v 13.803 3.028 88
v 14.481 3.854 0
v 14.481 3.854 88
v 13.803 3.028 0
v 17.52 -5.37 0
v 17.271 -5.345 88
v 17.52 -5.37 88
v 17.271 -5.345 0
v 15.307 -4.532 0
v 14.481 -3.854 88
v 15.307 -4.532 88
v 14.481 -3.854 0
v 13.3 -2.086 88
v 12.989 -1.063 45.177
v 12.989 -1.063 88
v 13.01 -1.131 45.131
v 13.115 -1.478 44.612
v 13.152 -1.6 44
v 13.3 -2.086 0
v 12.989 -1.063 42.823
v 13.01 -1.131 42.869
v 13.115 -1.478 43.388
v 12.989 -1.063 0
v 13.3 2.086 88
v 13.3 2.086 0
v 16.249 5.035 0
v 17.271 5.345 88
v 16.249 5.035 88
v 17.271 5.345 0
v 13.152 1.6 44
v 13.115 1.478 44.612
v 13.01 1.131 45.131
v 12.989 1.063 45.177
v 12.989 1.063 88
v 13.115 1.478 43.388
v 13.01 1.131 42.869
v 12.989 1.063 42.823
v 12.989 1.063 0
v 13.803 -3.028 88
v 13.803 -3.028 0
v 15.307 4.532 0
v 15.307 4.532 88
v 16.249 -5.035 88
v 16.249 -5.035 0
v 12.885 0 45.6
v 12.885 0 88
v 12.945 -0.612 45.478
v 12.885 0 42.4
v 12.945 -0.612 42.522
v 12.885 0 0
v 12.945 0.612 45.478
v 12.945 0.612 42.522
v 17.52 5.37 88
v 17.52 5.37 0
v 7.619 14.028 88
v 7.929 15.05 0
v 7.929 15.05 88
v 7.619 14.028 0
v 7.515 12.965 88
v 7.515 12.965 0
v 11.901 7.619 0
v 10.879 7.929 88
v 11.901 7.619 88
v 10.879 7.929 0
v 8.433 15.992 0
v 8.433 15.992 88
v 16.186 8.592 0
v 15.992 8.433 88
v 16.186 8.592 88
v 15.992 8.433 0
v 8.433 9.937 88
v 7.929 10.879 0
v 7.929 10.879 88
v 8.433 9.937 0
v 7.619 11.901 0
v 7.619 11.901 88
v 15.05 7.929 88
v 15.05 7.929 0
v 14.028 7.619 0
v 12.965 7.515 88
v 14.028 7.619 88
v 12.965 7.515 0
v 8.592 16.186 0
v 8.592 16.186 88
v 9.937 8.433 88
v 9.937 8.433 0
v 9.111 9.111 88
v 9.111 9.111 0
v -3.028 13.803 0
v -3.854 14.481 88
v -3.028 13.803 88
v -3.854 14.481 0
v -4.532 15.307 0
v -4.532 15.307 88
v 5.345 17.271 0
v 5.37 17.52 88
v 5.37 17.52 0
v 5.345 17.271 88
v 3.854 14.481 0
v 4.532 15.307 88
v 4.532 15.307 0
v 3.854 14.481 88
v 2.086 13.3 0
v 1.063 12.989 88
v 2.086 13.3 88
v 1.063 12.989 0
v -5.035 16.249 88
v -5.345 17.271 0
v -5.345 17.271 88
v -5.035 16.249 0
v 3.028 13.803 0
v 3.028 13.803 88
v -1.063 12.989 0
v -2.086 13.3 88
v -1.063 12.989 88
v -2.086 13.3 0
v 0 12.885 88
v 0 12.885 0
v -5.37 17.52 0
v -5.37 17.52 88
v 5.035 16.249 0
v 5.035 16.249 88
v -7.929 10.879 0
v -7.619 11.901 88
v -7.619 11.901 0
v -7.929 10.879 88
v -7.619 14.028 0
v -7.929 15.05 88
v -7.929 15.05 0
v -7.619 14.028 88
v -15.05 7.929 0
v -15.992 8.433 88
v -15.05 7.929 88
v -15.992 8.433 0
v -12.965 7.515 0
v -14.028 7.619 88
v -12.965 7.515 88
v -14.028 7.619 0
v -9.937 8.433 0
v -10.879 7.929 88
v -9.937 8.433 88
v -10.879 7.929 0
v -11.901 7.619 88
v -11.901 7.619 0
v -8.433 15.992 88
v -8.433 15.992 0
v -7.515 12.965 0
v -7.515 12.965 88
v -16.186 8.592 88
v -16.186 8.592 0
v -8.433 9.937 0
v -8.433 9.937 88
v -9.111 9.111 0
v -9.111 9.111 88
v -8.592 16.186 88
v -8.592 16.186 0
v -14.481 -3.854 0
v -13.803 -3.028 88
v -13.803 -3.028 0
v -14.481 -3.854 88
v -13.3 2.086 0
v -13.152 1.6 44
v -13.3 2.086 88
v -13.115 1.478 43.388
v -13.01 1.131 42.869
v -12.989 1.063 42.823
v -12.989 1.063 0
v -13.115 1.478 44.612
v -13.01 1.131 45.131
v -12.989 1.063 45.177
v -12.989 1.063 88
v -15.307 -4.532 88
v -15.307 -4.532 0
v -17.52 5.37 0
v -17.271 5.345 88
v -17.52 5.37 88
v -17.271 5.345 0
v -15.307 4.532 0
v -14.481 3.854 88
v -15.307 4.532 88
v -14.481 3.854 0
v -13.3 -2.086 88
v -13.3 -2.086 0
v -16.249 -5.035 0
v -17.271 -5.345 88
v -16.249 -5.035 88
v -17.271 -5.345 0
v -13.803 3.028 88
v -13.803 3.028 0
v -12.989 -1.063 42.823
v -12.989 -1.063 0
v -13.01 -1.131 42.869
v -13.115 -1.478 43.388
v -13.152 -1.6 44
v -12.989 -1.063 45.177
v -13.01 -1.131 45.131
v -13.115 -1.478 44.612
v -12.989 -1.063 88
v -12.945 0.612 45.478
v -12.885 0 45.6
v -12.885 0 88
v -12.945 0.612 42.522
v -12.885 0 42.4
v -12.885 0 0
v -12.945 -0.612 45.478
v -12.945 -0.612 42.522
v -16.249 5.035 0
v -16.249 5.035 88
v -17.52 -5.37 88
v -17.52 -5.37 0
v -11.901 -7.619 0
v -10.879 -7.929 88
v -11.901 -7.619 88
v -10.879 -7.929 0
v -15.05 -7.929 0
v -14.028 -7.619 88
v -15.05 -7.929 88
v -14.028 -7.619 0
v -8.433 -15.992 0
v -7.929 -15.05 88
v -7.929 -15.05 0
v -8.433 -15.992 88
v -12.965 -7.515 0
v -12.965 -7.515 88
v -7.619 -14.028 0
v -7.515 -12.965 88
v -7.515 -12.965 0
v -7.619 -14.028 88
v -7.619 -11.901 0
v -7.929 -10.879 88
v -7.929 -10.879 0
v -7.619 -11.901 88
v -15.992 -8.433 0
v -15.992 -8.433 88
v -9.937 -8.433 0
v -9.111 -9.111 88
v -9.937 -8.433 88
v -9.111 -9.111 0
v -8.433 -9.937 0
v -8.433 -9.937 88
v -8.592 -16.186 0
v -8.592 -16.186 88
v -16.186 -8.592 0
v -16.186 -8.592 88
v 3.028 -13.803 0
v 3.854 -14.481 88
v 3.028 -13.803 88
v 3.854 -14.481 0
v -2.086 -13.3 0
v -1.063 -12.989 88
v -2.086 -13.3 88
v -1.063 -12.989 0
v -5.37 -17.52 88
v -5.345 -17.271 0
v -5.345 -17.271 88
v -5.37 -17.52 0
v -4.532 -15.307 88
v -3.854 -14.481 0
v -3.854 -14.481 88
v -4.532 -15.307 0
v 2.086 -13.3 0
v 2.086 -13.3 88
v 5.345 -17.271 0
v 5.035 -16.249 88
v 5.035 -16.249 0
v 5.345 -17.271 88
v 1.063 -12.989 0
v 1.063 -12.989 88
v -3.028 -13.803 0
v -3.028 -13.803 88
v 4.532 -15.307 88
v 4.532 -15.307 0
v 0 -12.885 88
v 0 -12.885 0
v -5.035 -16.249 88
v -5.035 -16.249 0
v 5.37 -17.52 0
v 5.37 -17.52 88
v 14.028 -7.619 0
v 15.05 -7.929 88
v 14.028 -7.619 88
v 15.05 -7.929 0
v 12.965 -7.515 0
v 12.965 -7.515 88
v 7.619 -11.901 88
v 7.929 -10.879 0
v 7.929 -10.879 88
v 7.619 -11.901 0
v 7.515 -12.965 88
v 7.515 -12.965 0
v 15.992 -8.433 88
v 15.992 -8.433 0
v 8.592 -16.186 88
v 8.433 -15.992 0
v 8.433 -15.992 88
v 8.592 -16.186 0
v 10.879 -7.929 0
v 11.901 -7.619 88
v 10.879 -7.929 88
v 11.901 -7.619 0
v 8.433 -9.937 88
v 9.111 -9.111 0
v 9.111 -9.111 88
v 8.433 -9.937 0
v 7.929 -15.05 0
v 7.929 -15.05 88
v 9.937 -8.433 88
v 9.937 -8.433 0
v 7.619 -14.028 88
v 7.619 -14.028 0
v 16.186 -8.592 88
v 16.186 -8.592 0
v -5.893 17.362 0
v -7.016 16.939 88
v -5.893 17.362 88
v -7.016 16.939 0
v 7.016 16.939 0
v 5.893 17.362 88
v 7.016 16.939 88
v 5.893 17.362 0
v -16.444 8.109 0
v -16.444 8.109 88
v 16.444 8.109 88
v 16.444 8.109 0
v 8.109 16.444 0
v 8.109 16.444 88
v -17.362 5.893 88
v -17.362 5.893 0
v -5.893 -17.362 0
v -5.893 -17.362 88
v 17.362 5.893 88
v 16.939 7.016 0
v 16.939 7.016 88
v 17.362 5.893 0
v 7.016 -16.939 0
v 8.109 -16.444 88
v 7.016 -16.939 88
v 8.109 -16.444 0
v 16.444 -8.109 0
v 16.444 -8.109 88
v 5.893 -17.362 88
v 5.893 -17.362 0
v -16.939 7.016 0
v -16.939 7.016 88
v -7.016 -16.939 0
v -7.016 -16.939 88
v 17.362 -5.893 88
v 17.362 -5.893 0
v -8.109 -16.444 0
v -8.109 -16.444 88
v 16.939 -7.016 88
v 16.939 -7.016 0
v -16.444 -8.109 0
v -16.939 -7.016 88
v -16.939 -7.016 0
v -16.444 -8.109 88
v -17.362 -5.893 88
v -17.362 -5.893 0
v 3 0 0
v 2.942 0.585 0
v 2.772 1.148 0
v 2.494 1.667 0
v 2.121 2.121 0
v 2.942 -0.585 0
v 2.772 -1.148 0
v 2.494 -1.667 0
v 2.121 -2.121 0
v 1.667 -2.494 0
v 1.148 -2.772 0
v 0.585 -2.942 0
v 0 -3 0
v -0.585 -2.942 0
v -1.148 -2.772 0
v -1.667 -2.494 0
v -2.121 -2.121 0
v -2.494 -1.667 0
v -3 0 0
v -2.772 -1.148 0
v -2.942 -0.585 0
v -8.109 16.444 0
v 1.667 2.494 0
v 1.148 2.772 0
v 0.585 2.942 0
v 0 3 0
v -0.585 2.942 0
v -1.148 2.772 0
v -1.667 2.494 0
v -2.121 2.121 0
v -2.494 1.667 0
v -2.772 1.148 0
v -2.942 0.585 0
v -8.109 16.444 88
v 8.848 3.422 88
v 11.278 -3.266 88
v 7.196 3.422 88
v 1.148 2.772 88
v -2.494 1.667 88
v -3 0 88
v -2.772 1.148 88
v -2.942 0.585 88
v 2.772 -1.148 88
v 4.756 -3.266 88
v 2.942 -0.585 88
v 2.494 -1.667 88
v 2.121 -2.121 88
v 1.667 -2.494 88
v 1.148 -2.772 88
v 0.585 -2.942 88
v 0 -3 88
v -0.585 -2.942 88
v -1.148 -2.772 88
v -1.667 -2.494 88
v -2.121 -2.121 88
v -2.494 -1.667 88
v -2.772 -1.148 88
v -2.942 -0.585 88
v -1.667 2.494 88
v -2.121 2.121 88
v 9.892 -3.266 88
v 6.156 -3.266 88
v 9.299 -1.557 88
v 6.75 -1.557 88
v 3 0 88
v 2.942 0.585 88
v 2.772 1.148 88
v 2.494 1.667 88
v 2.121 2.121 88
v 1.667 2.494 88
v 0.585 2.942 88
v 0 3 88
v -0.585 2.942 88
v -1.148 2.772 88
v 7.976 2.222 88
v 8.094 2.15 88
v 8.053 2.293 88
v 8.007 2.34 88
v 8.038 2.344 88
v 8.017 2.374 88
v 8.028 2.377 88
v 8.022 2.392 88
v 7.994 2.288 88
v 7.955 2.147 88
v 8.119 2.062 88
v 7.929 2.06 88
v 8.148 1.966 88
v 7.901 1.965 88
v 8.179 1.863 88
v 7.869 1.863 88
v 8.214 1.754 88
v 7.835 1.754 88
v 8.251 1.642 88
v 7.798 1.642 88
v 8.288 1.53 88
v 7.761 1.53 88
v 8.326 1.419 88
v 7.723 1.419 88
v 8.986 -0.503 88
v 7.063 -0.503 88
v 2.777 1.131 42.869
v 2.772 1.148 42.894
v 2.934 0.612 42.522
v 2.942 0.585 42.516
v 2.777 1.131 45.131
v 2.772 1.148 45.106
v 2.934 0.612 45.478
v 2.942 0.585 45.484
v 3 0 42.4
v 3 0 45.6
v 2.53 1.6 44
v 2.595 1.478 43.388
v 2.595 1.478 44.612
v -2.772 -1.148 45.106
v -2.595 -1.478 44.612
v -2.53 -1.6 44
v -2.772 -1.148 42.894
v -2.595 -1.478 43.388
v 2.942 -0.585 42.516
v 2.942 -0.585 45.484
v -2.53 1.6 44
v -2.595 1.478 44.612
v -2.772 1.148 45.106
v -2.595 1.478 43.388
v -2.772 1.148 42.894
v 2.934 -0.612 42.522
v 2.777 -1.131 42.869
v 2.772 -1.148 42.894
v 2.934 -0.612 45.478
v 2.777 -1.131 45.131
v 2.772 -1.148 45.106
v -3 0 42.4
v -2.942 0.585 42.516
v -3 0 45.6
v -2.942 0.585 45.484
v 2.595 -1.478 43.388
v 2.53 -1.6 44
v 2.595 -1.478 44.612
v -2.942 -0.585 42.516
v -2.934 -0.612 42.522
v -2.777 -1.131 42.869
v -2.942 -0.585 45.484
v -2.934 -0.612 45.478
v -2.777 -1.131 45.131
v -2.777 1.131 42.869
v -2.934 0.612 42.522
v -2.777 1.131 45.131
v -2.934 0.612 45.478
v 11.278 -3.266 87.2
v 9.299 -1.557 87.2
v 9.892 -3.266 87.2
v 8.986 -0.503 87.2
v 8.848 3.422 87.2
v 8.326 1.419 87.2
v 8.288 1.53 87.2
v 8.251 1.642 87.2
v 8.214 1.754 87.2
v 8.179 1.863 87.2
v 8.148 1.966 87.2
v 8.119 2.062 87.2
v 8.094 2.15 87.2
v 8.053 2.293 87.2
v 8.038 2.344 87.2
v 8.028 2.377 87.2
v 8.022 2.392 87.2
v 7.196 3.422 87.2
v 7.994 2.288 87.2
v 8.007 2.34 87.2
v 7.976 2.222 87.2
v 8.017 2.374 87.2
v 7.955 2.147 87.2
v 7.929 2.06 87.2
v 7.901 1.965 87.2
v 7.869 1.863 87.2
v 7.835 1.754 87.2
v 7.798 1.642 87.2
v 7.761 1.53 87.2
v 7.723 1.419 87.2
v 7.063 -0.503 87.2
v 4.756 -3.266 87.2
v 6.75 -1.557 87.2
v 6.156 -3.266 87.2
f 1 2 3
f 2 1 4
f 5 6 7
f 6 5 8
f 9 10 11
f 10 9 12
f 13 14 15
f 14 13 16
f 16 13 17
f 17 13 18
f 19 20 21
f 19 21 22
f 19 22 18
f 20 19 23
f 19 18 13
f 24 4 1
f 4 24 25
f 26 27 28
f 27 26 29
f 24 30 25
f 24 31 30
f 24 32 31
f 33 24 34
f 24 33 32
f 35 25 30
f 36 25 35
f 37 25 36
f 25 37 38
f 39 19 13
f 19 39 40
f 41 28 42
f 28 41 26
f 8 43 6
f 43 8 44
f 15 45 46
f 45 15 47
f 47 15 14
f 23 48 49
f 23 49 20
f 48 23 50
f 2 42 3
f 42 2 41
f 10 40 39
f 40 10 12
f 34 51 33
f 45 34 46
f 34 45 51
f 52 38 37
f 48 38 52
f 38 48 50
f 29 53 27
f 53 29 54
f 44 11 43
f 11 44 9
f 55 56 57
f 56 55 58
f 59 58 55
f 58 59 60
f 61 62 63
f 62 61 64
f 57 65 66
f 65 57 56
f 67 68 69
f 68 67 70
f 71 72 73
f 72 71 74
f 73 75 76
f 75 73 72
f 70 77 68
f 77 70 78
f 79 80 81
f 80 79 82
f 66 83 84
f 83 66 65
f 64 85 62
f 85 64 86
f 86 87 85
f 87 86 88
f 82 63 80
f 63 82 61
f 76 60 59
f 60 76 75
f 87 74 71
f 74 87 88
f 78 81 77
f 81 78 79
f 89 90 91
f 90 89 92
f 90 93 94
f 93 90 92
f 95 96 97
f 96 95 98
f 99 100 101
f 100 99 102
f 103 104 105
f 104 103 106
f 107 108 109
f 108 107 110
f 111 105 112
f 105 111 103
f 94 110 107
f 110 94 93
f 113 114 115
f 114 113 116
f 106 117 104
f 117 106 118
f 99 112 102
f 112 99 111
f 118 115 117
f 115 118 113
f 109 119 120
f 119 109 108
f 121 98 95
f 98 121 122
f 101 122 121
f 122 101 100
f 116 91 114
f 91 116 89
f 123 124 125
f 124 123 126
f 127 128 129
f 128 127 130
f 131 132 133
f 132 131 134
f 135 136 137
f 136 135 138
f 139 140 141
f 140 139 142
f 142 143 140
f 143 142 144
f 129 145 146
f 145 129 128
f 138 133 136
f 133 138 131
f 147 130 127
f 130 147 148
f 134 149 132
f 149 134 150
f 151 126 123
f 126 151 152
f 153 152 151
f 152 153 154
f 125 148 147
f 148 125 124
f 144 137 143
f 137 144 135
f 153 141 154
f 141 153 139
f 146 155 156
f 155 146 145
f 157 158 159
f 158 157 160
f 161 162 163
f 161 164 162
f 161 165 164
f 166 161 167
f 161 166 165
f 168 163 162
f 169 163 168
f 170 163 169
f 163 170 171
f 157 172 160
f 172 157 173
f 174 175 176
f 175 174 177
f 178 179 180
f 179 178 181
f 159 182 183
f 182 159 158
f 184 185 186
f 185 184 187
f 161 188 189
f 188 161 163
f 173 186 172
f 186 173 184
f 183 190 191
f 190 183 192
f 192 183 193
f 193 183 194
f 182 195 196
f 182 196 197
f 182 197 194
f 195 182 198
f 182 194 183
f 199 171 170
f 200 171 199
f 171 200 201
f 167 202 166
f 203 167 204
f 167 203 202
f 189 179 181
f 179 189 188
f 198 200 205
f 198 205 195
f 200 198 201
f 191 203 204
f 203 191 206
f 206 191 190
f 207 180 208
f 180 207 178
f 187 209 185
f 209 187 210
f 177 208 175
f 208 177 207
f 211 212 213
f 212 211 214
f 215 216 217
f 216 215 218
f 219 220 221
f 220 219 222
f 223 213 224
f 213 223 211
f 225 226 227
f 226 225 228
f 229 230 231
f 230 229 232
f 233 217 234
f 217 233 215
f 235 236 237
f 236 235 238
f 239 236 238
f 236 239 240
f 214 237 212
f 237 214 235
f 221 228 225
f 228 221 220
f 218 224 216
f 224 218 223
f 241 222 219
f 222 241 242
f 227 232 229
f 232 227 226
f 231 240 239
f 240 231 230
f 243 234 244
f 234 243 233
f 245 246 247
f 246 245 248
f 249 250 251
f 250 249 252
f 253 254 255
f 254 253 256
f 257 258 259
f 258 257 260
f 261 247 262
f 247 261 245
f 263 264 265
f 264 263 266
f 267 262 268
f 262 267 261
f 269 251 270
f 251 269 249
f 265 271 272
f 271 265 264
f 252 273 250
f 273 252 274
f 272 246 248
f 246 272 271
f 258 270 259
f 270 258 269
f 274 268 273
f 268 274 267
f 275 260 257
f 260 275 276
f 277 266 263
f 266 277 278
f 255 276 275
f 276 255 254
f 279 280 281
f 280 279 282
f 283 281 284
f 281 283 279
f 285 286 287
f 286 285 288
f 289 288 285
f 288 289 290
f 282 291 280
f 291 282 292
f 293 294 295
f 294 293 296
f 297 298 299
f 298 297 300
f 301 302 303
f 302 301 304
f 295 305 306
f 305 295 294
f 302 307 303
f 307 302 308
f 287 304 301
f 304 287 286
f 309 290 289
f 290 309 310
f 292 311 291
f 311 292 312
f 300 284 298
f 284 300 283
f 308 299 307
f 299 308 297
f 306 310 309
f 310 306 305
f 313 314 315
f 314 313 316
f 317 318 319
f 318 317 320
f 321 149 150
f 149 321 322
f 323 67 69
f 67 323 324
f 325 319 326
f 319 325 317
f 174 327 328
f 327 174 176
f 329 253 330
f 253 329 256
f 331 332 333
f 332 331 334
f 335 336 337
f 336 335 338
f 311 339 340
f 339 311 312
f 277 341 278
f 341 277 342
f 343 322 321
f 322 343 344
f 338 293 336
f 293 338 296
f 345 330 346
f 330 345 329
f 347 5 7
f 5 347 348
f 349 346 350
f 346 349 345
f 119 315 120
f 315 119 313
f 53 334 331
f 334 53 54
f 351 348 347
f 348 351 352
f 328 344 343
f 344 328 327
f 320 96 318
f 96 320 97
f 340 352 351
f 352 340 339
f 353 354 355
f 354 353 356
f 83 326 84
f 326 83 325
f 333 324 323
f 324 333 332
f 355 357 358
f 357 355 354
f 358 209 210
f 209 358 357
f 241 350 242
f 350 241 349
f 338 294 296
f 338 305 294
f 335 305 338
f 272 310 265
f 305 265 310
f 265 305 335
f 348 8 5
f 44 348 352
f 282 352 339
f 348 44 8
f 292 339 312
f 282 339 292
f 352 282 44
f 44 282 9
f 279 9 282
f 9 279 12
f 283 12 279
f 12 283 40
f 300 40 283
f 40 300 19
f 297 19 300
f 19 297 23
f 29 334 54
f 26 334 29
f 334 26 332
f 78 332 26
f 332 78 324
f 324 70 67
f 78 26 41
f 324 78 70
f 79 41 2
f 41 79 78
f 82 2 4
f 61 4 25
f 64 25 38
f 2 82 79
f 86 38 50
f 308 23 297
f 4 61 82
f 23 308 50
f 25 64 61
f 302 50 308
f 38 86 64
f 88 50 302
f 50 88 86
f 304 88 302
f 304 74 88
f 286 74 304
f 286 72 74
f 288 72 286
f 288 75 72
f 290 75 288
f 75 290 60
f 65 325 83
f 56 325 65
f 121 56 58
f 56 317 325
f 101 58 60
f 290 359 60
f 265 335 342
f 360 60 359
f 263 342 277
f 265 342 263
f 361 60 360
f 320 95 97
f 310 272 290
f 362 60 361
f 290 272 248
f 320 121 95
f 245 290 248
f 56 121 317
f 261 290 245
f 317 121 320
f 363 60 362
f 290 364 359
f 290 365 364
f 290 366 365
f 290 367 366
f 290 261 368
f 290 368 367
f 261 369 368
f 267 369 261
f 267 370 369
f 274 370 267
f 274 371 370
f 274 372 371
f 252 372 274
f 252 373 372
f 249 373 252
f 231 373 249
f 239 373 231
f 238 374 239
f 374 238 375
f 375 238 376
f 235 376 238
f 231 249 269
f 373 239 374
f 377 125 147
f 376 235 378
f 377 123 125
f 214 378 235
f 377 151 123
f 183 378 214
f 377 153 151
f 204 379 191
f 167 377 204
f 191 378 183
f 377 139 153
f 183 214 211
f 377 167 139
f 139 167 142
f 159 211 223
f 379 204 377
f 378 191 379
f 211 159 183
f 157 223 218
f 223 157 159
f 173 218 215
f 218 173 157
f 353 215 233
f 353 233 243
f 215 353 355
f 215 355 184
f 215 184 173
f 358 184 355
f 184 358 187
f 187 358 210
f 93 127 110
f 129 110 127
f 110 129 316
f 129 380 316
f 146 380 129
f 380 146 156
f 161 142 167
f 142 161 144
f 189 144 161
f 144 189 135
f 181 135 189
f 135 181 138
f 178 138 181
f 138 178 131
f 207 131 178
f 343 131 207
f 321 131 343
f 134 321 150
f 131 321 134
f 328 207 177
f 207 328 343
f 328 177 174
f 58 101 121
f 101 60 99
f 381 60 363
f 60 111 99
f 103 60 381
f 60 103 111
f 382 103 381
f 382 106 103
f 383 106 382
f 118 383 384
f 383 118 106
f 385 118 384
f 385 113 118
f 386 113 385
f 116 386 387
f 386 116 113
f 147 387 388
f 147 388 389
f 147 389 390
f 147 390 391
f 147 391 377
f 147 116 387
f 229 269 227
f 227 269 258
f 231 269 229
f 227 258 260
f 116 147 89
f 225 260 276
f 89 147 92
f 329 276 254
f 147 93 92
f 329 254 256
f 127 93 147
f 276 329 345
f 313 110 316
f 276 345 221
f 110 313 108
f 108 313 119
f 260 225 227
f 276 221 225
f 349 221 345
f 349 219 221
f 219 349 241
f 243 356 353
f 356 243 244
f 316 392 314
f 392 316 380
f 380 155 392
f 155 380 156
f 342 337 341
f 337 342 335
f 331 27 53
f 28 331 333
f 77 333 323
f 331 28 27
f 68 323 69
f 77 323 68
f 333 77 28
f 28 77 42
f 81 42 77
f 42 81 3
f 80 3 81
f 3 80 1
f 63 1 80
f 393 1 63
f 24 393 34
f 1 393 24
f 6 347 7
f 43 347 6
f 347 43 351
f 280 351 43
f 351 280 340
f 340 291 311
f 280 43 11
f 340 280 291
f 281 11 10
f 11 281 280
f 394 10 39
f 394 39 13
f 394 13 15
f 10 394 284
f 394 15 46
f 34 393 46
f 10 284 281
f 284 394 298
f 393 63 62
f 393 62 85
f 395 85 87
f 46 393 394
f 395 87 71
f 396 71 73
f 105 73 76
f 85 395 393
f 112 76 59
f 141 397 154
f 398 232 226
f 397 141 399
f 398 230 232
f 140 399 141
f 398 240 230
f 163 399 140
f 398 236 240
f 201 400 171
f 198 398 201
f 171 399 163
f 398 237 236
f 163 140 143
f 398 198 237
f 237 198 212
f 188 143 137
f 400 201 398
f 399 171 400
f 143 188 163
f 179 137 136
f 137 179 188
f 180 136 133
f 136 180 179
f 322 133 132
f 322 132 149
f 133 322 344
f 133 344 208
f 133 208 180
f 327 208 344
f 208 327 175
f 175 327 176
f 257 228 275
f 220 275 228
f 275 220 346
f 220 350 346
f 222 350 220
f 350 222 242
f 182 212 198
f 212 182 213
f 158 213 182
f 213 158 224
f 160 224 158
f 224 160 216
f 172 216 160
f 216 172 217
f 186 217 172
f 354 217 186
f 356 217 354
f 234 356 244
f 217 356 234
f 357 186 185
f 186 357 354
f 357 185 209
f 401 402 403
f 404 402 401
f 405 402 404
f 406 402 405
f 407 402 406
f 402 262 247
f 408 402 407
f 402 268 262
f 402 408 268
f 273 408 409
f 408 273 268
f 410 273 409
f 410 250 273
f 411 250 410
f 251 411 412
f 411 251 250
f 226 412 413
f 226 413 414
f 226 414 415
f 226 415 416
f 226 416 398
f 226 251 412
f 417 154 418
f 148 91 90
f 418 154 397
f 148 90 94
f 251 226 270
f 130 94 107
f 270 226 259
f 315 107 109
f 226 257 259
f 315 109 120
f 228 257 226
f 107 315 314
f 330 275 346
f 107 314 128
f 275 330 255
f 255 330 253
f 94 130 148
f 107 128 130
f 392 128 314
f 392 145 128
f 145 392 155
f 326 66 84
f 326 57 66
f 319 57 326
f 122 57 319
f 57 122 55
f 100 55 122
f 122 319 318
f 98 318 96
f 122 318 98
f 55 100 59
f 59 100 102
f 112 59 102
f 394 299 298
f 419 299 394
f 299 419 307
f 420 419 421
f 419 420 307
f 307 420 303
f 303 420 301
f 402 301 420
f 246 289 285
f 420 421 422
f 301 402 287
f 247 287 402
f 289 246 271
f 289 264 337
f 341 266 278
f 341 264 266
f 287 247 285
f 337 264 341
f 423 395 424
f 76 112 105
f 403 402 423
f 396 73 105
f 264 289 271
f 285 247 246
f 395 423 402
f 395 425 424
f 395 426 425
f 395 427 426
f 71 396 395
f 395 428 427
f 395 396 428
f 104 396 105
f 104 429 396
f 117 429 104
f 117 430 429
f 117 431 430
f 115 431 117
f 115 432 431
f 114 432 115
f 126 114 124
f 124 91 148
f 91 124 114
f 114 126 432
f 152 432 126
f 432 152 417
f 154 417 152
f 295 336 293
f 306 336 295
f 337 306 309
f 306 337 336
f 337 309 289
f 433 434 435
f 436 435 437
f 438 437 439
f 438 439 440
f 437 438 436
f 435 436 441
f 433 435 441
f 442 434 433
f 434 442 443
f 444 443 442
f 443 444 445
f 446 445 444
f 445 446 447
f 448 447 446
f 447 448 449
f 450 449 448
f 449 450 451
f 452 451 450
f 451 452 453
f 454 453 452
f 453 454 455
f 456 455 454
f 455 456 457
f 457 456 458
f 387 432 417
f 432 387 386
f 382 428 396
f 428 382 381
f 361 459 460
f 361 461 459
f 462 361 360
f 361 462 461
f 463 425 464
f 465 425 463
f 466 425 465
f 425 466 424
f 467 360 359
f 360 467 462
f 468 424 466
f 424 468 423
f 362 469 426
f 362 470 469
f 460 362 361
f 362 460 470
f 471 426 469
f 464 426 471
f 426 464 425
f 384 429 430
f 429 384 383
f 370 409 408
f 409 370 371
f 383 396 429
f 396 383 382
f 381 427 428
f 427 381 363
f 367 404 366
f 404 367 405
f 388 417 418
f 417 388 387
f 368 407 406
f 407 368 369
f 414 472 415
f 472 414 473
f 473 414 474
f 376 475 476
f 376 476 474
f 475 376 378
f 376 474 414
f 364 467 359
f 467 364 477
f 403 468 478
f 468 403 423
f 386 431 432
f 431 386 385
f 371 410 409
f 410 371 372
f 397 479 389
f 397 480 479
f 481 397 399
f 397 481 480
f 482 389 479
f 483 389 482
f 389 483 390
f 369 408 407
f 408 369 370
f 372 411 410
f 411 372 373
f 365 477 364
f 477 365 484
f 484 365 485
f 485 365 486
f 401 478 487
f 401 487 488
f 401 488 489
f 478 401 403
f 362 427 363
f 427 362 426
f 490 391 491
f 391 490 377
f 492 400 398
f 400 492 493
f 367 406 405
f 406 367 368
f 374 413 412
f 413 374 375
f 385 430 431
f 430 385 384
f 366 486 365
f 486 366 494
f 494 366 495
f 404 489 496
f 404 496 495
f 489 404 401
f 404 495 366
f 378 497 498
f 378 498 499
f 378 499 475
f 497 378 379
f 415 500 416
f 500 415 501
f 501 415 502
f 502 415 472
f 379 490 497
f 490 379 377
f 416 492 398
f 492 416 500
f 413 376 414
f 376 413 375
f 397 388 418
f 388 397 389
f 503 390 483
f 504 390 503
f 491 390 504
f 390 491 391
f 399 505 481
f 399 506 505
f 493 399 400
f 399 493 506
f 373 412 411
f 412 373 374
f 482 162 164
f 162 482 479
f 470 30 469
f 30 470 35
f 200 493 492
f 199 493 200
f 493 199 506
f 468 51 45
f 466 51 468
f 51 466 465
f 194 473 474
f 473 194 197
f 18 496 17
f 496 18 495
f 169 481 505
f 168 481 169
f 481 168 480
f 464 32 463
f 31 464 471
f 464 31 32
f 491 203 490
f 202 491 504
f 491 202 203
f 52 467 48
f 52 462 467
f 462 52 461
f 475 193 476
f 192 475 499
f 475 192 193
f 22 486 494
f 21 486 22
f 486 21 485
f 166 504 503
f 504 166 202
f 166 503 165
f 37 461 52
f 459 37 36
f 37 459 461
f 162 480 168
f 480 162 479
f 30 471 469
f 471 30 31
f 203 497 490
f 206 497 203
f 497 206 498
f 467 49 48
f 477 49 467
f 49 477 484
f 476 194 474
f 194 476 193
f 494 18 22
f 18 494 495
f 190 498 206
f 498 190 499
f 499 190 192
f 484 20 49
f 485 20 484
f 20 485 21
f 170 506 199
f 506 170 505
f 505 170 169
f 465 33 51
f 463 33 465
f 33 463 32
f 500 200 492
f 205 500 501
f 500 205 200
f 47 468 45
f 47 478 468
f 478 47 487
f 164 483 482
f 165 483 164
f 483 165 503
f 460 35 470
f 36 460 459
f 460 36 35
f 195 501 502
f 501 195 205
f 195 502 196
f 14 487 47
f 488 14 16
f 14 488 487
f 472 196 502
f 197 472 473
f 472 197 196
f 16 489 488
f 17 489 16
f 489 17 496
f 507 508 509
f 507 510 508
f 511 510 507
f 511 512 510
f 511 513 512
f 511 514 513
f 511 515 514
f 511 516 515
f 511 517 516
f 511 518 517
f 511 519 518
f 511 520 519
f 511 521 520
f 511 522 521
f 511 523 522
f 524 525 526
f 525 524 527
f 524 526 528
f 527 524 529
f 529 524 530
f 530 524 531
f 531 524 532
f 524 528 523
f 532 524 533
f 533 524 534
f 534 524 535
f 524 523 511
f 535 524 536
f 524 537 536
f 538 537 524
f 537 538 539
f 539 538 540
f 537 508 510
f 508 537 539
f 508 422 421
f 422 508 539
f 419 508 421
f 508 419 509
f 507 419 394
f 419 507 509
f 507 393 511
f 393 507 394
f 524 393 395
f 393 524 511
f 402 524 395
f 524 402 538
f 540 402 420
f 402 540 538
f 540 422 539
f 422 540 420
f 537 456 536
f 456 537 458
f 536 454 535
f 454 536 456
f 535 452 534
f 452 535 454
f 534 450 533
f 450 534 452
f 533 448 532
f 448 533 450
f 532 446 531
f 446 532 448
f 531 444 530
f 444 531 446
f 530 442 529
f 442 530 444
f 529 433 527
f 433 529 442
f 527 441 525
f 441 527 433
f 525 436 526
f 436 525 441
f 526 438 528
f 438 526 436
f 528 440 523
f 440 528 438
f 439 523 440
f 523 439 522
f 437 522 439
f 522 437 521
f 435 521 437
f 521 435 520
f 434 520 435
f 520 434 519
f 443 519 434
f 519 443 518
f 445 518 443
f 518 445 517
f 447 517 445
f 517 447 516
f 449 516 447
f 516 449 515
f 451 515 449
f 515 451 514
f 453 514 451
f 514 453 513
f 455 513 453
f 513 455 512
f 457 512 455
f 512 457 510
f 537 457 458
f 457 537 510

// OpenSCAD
// file: helpers.scad
// Shared 2D helpers used by wedge.scad, base.scad and lid.scad.

// Big half-plane (y >= 0), used to build angle masks. `big` just has to be
// larger than any radius used in the design.
module halfplane(big = 2000) {
    translate([-big/2, 0]) square([big, big]);
}

// An angular mask covering [-a/2, +a/2], built as the intersection of two
// half-planes rather than an origin-apex polygon: a sector polygon with its
// point pinned exactly at (0,0) tends to produce a self-touching ("bowtie")
// result once differenced against a same-apex sector for the inner radius,
// which extrudes into a non-manifold solid. Two rotated half-planes never
// share that degenerate vertex.
module angle_mask(a) {
    intersection() {
        rotate([0, 0, -a/2]) halfplane();
        rotate([0, 0, a/2 - 180]) halfplane();
    }
}

// A ring slice between radius r1 and r2, angular width a, centered on angle 0.
module ring_slice(r1, r2, a) {
    intersection() {
        difference() {
            circle(r = r2, $fn = 128);
            circle(r = r1, $fn = 128);
        }
        angle_mask(a);
    }
}

// --- Identificazione pezzi: una lettera incisa su ogni pezzo stampato ------
// Vedi la legenda completa (A-O) in assembly-guide.md. Uso: mettere questa
// come ultima operazione di un difference() sul solido del pezzo, dopo tutti
// gli altri fori/tagli. `ztop` è la quota della faccia piatta su cui incidere
// (nel sistema di coordinate locale del pezzo in quel punto); il taglio parte
// 0.8mm sotto e arriva 0.5mm sopra la faccia, apposta più profondo della sola
// incisione per evitare superfici coincidenti (stesso problema di mesh non
// manifold già visto altrove in questo progetto se il taglio si fermasse
// esattamente sulla superficie).
module label_cut(letter, x, y, ztop, depth = 0.8, size = 7) {
    translate([x, y, ztop - depth])
        linear_extrude(height = depth + 0.5)
            text(letter, size = size, halign = "center", valign = "center",
                 font = "Liberation Sans:style=Bold");
}

// Come label_cut, ma per una faccia con normale lungo +Y invece di +Z (il
// caso di front_panel.scad, dove lo spessore del pannello è lungo Y, non
// Z). Stessa tecnica rotate([90,0,0]) verificata per label_tag: senza
// questa versione, label_cut inciderebbe nella direzione sbagliata.
module label_cut_y(letter, x, yface, z, depth = 0.8, size = 7) {
    translate([x, yface + 0.5, z])
        rotate([90, 0, 0])
            linear_extrude(height = depth + 0.5)
                text(letter, size = size, halign = "center", valign = "center",
                     font = "Liberation Sans:style=Bold");
}

// Targhetta autoportante per pezzi troppo sottili per un'incisione diretta
// (griglia, scivolo): un piccolo blocco pieno fuso per unione con un margine
// di sovrapposizione reale nel pezzo esistente (non solo a contatto), con la
// lettera incisa sulla faccia esterna. `w`/`d`/`h` sono le dimensioni del
// blocco lungo X/Y/Z; il chiamante lo posiziona/ruota così che l'estremità
// -Y penetri nel pezzo di `overlap` mm.
module label_tag(letter, w = 12, d = 6, h = 6, overlap = 2.5, depth = 0.7, size = 5.5) {
    difference() {
        translate([-w/2, -overlap, -h/2])
            cube([w, d + overlap, h]);
        // rotate([90,0,0]) manda l'estrusione di testo (di default lungo +Z,
        // faccia a z=0) a un'estrusione lungo -Y con la faccia a y=0 —
        // verificato esportando solo questo taglio e leggendo il bounding box
        // risultante, non a occhio. Traslando quella faccia a y=d+0.5 il
        // taglio arriva da y=d-depth (dentro il blocco) a y=d+0.5 (oltre la
        // faccia esterna a y=d).
        translate([0, d + 0.5, 0])
            rotate([90, 0, 0])
                linear_extrude(height = depth + 0.5)
                    text(letter, size = size, halign = "center", valign = "center",
                         font = "Liberation Sans:style=Bold");
    }
}
// main file
// Rullo scanalato (singolarizzatore) — stampa 1x.
// Progettato con l'asse di rotazione lungo Z (come i vecchi file del
// carosello) per riusare helpers.scad; in assembly.scad viene ruotato di
// 90° per giacere orizzontale, immerso nella tramoggia.
//
// Ogni scanalatura è un canale cilindrico lungo tutta la lunghezza del
// rullo, dimensionato per UNA sola sigaretta (troppo stretto perché due ci
// stiano affiancate — vedi il controllo in params.scad: groove_d < 2*cig_d).
include <params.scad>
include <helpers.scad>

// Lettera "A" (vedi assembly-guide.md): incisa sulla faccia piatta di
// un'estremità, nell'anello pieno tra il foro albero (r=shaft_d/2) e il
// fondo delle scanalature (r=core_r) — l'unica zona senza tagli.
module roller() {
    difference() {
        cylinder(r = roller_r, h = roller_len, $fn = 96);
        for (i = [0 : flutes - 1])
            rotate([0, 0, i * 360 / flutes])
                translate([r_pitch, 0, -1])
                    cylinder(r = groove_d/2, h = roller_len + 2, $fn = 32);
        // foro per il giunto dell'albero motore
        translate([0, 0, -1])
            cylinder(d = shaft_d, h = roller_len + 2, $fn = 32);
        // foro per la vite di bloccaggio del giunto
        translate([-roller_r - 1, 0, roller_len/2])
            rotate([0, 90, 0])
                cylinder(d = 3.2, h = roller_r*2 + 2, $fn = 16);
        label_cut("A", (shaft_d/2 + core_r)/2, 0, roller_len);
    }
}

roller();
